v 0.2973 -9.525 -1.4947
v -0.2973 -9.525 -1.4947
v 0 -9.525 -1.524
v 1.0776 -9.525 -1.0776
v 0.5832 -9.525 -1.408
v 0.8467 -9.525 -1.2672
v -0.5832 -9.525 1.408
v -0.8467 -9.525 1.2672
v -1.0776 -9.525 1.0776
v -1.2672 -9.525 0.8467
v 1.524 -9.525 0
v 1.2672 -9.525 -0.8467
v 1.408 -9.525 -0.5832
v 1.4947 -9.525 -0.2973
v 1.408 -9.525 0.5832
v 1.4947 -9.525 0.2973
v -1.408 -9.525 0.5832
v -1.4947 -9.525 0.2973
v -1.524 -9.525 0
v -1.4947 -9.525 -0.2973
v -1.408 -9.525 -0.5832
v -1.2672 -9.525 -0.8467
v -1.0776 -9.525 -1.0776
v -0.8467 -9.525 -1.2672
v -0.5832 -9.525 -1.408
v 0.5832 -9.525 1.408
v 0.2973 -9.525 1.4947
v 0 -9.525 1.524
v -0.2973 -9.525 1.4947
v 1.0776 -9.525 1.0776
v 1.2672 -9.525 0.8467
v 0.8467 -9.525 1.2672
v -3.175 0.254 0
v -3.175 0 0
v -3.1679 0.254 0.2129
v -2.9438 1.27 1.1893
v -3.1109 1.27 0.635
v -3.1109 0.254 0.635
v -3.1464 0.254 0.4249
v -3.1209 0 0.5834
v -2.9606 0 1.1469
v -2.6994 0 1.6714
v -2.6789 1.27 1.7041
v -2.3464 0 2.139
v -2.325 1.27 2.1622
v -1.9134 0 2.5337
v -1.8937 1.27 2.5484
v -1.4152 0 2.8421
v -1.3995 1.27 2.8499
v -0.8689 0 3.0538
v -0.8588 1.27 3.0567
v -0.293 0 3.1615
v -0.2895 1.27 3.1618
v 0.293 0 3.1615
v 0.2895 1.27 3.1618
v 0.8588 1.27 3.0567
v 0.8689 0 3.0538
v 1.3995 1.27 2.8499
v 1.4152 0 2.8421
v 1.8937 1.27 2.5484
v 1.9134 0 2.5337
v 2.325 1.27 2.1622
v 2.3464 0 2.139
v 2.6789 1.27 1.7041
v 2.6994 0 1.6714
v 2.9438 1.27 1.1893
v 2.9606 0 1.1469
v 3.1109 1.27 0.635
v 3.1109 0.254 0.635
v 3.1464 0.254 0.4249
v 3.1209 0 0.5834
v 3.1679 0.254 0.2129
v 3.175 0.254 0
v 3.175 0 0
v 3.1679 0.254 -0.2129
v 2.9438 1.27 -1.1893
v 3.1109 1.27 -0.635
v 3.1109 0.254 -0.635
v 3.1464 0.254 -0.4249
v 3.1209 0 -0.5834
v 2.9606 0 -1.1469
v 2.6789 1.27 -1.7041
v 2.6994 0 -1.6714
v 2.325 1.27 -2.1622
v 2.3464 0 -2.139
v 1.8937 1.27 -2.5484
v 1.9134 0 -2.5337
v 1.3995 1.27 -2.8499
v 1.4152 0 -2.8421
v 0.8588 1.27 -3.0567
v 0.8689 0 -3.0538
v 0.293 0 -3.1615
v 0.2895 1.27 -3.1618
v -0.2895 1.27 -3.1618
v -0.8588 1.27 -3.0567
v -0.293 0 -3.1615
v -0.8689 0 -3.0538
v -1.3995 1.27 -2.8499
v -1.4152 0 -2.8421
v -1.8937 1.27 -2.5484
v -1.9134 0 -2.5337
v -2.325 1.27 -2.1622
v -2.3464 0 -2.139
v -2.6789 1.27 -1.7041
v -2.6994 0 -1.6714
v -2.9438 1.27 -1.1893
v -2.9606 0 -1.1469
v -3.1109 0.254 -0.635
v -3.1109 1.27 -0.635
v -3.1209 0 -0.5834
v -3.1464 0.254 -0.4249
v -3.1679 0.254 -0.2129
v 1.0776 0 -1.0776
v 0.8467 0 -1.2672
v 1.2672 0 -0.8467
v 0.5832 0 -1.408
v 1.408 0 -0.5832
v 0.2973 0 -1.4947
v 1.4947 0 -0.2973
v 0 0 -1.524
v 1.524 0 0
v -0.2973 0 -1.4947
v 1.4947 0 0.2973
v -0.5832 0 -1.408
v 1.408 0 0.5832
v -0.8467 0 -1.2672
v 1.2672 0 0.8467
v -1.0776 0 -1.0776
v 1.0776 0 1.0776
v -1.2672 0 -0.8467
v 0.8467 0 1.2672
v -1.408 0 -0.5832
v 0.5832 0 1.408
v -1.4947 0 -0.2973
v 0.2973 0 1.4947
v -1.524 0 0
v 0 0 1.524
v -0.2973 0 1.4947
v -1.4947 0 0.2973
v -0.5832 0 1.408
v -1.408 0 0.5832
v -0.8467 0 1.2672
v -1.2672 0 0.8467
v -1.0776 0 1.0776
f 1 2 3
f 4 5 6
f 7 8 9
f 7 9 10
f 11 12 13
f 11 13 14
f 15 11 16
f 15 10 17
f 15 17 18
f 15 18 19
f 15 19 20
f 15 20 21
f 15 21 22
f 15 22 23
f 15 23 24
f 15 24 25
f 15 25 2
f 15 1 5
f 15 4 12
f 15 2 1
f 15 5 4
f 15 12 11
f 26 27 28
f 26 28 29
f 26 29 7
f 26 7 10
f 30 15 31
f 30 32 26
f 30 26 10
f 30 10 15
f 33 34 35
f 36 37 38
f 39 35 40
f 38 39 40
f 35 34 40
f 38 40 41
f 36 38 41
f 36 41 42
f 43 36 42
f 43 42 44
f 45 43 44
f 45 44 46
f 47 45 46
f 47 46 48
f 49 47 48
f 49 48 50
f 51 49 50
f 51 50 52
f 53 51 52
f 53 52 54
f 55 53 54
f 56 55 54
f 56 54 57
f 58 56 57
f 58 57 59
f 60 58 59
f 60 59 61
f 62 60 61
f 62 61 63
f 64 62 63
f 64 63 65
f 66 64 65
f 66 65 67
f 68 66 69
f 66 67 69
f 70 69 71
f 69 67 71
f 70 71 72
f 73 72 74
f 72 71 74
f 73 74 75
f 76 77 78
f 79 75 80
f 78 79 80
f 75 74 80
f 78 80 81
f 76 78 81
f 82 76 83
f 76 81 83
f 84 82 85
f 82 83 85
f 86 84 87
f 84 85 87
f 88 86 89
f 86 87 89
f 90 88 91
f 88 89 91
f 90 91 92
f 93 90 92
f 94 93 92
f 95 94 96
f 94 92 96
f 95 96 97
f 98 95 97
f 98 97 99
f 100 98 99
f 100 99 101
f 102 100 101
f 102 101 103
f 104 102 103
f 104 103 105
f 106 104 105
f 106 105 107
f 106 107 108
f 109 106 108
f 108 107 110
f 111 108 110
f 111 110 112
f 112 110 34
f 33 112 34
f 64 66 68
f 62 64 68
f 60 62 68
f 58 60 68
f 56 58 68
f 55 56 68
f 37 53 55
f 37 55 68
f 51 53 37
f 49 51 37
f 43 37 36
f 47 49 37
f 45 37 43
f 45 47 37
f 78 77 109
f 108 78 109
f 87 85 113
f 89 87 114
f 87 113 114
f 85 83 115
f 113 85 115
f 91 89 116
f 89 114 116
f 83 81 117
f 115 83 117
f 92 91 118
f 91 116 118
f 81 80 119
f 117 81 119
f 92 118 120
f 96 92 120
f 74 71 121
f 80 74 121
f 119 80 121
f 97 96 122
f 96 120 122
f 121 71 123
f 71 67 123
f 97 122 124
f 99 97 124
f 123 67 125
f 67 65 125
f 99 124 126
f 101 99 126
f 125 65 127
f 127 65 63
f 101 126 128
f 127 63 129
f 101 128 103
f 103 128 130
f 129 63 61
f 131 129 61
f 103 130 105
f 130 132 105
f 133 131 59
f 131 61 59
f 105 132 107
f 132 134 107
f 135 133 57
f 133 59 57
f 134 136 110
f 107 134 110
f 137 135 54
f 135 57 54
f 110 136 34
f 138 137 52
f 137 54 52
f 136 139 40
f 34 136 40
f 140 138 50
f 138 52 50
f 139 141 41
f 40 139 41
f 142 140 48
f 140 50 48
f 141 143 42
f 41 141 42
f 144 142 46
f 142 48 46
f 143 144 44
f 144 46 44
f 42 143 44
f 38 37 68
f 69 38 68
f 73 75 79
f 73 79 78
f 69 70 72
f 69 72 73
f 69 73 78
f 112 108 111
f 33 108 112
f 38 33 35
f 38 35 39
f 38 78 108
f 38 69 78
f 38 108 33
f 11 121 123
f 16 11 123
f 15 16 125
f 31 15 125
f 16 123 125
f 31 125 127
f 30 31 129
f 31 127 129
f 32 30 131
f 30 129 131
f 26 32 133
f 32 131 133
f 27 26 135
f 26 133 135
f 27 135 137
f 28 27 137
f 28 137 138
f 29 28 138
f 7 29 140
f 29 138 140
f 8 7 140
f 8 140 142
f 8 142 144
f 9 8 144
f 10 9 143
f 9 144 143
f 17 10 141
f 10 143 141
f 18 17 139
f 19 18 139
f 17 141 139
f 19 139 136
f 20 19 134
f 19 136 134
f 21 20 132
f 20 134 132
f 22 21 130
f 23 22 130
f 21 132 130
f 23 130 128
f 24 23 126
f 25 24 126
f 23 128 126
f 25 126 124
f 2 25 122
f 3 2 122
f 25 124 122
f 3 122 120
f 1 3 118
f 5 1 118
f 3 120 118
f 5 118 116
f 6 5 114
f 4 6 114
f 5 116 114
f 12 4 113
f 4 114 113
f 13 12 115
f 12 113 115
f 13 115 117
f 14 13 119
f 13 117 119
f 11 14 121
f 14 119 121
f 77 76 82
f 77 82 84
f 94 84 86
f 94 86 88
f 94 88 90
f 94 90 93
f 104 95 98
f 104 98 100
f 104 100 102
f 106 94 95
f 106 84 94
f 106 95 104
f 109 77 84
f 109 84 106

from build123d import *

# Parameters (mm, degrees)
F0_R     = 1.524
F1_DEPTH = 9.525
F2_R     = 3.175
F3_DEPTH = 1.27
F5_DEPTH = 1.016


with BuildPart() as f1:
    # F0 (on Front) → F1 (new body)
    with BuildSketch(Plane.XZ):
        Circle(F0_R)
    extrude(amount=F1_DEPTH)

    # F2 (on face) → F3 (join)
    with BuildSketch(Plane(origin=(0, 0, 0), x_dir=(-1, 0, 0), z_dir=(0, 1, 0))):
        Circle(F2_R)
    extrude(amount=F3_DEPTH)

    # F4 (on face) → F5 (cut)
    with BuildSketch(Plane(origin=(0, 1.27, 0), x_dir=(-1, 0, 0), z_dir=(0, 1, 0))):
        with BuildLine():
            ThreePointArc((3.175, 0), (3.1589222858, 0.3191159544), (3.1108519733, 0.635))
            Line((3.1108519733, 0.635), (-3.1108519733, 0.635))
            ThreePointArc((-3.1108519733, 0.635), (-3.1589222858, 0.3191159544), (-3.175, 0))
            ThreePointArc((-3.175, 0), (-3.1589222858, -0.3191159544), (-3.1108519733, -0.635))
            Line((-3.1108519733, -0.635), (3.1108519733, -0.635))
            ThreePointArc((3.1108519733, -0.635), (3.1589222858, -0.3191159544), (3.175, 0))
        make_face()
    extrude(amount=-F5_DEPTH, mode=Mode.SUBTRACT)


solid = f1.part
